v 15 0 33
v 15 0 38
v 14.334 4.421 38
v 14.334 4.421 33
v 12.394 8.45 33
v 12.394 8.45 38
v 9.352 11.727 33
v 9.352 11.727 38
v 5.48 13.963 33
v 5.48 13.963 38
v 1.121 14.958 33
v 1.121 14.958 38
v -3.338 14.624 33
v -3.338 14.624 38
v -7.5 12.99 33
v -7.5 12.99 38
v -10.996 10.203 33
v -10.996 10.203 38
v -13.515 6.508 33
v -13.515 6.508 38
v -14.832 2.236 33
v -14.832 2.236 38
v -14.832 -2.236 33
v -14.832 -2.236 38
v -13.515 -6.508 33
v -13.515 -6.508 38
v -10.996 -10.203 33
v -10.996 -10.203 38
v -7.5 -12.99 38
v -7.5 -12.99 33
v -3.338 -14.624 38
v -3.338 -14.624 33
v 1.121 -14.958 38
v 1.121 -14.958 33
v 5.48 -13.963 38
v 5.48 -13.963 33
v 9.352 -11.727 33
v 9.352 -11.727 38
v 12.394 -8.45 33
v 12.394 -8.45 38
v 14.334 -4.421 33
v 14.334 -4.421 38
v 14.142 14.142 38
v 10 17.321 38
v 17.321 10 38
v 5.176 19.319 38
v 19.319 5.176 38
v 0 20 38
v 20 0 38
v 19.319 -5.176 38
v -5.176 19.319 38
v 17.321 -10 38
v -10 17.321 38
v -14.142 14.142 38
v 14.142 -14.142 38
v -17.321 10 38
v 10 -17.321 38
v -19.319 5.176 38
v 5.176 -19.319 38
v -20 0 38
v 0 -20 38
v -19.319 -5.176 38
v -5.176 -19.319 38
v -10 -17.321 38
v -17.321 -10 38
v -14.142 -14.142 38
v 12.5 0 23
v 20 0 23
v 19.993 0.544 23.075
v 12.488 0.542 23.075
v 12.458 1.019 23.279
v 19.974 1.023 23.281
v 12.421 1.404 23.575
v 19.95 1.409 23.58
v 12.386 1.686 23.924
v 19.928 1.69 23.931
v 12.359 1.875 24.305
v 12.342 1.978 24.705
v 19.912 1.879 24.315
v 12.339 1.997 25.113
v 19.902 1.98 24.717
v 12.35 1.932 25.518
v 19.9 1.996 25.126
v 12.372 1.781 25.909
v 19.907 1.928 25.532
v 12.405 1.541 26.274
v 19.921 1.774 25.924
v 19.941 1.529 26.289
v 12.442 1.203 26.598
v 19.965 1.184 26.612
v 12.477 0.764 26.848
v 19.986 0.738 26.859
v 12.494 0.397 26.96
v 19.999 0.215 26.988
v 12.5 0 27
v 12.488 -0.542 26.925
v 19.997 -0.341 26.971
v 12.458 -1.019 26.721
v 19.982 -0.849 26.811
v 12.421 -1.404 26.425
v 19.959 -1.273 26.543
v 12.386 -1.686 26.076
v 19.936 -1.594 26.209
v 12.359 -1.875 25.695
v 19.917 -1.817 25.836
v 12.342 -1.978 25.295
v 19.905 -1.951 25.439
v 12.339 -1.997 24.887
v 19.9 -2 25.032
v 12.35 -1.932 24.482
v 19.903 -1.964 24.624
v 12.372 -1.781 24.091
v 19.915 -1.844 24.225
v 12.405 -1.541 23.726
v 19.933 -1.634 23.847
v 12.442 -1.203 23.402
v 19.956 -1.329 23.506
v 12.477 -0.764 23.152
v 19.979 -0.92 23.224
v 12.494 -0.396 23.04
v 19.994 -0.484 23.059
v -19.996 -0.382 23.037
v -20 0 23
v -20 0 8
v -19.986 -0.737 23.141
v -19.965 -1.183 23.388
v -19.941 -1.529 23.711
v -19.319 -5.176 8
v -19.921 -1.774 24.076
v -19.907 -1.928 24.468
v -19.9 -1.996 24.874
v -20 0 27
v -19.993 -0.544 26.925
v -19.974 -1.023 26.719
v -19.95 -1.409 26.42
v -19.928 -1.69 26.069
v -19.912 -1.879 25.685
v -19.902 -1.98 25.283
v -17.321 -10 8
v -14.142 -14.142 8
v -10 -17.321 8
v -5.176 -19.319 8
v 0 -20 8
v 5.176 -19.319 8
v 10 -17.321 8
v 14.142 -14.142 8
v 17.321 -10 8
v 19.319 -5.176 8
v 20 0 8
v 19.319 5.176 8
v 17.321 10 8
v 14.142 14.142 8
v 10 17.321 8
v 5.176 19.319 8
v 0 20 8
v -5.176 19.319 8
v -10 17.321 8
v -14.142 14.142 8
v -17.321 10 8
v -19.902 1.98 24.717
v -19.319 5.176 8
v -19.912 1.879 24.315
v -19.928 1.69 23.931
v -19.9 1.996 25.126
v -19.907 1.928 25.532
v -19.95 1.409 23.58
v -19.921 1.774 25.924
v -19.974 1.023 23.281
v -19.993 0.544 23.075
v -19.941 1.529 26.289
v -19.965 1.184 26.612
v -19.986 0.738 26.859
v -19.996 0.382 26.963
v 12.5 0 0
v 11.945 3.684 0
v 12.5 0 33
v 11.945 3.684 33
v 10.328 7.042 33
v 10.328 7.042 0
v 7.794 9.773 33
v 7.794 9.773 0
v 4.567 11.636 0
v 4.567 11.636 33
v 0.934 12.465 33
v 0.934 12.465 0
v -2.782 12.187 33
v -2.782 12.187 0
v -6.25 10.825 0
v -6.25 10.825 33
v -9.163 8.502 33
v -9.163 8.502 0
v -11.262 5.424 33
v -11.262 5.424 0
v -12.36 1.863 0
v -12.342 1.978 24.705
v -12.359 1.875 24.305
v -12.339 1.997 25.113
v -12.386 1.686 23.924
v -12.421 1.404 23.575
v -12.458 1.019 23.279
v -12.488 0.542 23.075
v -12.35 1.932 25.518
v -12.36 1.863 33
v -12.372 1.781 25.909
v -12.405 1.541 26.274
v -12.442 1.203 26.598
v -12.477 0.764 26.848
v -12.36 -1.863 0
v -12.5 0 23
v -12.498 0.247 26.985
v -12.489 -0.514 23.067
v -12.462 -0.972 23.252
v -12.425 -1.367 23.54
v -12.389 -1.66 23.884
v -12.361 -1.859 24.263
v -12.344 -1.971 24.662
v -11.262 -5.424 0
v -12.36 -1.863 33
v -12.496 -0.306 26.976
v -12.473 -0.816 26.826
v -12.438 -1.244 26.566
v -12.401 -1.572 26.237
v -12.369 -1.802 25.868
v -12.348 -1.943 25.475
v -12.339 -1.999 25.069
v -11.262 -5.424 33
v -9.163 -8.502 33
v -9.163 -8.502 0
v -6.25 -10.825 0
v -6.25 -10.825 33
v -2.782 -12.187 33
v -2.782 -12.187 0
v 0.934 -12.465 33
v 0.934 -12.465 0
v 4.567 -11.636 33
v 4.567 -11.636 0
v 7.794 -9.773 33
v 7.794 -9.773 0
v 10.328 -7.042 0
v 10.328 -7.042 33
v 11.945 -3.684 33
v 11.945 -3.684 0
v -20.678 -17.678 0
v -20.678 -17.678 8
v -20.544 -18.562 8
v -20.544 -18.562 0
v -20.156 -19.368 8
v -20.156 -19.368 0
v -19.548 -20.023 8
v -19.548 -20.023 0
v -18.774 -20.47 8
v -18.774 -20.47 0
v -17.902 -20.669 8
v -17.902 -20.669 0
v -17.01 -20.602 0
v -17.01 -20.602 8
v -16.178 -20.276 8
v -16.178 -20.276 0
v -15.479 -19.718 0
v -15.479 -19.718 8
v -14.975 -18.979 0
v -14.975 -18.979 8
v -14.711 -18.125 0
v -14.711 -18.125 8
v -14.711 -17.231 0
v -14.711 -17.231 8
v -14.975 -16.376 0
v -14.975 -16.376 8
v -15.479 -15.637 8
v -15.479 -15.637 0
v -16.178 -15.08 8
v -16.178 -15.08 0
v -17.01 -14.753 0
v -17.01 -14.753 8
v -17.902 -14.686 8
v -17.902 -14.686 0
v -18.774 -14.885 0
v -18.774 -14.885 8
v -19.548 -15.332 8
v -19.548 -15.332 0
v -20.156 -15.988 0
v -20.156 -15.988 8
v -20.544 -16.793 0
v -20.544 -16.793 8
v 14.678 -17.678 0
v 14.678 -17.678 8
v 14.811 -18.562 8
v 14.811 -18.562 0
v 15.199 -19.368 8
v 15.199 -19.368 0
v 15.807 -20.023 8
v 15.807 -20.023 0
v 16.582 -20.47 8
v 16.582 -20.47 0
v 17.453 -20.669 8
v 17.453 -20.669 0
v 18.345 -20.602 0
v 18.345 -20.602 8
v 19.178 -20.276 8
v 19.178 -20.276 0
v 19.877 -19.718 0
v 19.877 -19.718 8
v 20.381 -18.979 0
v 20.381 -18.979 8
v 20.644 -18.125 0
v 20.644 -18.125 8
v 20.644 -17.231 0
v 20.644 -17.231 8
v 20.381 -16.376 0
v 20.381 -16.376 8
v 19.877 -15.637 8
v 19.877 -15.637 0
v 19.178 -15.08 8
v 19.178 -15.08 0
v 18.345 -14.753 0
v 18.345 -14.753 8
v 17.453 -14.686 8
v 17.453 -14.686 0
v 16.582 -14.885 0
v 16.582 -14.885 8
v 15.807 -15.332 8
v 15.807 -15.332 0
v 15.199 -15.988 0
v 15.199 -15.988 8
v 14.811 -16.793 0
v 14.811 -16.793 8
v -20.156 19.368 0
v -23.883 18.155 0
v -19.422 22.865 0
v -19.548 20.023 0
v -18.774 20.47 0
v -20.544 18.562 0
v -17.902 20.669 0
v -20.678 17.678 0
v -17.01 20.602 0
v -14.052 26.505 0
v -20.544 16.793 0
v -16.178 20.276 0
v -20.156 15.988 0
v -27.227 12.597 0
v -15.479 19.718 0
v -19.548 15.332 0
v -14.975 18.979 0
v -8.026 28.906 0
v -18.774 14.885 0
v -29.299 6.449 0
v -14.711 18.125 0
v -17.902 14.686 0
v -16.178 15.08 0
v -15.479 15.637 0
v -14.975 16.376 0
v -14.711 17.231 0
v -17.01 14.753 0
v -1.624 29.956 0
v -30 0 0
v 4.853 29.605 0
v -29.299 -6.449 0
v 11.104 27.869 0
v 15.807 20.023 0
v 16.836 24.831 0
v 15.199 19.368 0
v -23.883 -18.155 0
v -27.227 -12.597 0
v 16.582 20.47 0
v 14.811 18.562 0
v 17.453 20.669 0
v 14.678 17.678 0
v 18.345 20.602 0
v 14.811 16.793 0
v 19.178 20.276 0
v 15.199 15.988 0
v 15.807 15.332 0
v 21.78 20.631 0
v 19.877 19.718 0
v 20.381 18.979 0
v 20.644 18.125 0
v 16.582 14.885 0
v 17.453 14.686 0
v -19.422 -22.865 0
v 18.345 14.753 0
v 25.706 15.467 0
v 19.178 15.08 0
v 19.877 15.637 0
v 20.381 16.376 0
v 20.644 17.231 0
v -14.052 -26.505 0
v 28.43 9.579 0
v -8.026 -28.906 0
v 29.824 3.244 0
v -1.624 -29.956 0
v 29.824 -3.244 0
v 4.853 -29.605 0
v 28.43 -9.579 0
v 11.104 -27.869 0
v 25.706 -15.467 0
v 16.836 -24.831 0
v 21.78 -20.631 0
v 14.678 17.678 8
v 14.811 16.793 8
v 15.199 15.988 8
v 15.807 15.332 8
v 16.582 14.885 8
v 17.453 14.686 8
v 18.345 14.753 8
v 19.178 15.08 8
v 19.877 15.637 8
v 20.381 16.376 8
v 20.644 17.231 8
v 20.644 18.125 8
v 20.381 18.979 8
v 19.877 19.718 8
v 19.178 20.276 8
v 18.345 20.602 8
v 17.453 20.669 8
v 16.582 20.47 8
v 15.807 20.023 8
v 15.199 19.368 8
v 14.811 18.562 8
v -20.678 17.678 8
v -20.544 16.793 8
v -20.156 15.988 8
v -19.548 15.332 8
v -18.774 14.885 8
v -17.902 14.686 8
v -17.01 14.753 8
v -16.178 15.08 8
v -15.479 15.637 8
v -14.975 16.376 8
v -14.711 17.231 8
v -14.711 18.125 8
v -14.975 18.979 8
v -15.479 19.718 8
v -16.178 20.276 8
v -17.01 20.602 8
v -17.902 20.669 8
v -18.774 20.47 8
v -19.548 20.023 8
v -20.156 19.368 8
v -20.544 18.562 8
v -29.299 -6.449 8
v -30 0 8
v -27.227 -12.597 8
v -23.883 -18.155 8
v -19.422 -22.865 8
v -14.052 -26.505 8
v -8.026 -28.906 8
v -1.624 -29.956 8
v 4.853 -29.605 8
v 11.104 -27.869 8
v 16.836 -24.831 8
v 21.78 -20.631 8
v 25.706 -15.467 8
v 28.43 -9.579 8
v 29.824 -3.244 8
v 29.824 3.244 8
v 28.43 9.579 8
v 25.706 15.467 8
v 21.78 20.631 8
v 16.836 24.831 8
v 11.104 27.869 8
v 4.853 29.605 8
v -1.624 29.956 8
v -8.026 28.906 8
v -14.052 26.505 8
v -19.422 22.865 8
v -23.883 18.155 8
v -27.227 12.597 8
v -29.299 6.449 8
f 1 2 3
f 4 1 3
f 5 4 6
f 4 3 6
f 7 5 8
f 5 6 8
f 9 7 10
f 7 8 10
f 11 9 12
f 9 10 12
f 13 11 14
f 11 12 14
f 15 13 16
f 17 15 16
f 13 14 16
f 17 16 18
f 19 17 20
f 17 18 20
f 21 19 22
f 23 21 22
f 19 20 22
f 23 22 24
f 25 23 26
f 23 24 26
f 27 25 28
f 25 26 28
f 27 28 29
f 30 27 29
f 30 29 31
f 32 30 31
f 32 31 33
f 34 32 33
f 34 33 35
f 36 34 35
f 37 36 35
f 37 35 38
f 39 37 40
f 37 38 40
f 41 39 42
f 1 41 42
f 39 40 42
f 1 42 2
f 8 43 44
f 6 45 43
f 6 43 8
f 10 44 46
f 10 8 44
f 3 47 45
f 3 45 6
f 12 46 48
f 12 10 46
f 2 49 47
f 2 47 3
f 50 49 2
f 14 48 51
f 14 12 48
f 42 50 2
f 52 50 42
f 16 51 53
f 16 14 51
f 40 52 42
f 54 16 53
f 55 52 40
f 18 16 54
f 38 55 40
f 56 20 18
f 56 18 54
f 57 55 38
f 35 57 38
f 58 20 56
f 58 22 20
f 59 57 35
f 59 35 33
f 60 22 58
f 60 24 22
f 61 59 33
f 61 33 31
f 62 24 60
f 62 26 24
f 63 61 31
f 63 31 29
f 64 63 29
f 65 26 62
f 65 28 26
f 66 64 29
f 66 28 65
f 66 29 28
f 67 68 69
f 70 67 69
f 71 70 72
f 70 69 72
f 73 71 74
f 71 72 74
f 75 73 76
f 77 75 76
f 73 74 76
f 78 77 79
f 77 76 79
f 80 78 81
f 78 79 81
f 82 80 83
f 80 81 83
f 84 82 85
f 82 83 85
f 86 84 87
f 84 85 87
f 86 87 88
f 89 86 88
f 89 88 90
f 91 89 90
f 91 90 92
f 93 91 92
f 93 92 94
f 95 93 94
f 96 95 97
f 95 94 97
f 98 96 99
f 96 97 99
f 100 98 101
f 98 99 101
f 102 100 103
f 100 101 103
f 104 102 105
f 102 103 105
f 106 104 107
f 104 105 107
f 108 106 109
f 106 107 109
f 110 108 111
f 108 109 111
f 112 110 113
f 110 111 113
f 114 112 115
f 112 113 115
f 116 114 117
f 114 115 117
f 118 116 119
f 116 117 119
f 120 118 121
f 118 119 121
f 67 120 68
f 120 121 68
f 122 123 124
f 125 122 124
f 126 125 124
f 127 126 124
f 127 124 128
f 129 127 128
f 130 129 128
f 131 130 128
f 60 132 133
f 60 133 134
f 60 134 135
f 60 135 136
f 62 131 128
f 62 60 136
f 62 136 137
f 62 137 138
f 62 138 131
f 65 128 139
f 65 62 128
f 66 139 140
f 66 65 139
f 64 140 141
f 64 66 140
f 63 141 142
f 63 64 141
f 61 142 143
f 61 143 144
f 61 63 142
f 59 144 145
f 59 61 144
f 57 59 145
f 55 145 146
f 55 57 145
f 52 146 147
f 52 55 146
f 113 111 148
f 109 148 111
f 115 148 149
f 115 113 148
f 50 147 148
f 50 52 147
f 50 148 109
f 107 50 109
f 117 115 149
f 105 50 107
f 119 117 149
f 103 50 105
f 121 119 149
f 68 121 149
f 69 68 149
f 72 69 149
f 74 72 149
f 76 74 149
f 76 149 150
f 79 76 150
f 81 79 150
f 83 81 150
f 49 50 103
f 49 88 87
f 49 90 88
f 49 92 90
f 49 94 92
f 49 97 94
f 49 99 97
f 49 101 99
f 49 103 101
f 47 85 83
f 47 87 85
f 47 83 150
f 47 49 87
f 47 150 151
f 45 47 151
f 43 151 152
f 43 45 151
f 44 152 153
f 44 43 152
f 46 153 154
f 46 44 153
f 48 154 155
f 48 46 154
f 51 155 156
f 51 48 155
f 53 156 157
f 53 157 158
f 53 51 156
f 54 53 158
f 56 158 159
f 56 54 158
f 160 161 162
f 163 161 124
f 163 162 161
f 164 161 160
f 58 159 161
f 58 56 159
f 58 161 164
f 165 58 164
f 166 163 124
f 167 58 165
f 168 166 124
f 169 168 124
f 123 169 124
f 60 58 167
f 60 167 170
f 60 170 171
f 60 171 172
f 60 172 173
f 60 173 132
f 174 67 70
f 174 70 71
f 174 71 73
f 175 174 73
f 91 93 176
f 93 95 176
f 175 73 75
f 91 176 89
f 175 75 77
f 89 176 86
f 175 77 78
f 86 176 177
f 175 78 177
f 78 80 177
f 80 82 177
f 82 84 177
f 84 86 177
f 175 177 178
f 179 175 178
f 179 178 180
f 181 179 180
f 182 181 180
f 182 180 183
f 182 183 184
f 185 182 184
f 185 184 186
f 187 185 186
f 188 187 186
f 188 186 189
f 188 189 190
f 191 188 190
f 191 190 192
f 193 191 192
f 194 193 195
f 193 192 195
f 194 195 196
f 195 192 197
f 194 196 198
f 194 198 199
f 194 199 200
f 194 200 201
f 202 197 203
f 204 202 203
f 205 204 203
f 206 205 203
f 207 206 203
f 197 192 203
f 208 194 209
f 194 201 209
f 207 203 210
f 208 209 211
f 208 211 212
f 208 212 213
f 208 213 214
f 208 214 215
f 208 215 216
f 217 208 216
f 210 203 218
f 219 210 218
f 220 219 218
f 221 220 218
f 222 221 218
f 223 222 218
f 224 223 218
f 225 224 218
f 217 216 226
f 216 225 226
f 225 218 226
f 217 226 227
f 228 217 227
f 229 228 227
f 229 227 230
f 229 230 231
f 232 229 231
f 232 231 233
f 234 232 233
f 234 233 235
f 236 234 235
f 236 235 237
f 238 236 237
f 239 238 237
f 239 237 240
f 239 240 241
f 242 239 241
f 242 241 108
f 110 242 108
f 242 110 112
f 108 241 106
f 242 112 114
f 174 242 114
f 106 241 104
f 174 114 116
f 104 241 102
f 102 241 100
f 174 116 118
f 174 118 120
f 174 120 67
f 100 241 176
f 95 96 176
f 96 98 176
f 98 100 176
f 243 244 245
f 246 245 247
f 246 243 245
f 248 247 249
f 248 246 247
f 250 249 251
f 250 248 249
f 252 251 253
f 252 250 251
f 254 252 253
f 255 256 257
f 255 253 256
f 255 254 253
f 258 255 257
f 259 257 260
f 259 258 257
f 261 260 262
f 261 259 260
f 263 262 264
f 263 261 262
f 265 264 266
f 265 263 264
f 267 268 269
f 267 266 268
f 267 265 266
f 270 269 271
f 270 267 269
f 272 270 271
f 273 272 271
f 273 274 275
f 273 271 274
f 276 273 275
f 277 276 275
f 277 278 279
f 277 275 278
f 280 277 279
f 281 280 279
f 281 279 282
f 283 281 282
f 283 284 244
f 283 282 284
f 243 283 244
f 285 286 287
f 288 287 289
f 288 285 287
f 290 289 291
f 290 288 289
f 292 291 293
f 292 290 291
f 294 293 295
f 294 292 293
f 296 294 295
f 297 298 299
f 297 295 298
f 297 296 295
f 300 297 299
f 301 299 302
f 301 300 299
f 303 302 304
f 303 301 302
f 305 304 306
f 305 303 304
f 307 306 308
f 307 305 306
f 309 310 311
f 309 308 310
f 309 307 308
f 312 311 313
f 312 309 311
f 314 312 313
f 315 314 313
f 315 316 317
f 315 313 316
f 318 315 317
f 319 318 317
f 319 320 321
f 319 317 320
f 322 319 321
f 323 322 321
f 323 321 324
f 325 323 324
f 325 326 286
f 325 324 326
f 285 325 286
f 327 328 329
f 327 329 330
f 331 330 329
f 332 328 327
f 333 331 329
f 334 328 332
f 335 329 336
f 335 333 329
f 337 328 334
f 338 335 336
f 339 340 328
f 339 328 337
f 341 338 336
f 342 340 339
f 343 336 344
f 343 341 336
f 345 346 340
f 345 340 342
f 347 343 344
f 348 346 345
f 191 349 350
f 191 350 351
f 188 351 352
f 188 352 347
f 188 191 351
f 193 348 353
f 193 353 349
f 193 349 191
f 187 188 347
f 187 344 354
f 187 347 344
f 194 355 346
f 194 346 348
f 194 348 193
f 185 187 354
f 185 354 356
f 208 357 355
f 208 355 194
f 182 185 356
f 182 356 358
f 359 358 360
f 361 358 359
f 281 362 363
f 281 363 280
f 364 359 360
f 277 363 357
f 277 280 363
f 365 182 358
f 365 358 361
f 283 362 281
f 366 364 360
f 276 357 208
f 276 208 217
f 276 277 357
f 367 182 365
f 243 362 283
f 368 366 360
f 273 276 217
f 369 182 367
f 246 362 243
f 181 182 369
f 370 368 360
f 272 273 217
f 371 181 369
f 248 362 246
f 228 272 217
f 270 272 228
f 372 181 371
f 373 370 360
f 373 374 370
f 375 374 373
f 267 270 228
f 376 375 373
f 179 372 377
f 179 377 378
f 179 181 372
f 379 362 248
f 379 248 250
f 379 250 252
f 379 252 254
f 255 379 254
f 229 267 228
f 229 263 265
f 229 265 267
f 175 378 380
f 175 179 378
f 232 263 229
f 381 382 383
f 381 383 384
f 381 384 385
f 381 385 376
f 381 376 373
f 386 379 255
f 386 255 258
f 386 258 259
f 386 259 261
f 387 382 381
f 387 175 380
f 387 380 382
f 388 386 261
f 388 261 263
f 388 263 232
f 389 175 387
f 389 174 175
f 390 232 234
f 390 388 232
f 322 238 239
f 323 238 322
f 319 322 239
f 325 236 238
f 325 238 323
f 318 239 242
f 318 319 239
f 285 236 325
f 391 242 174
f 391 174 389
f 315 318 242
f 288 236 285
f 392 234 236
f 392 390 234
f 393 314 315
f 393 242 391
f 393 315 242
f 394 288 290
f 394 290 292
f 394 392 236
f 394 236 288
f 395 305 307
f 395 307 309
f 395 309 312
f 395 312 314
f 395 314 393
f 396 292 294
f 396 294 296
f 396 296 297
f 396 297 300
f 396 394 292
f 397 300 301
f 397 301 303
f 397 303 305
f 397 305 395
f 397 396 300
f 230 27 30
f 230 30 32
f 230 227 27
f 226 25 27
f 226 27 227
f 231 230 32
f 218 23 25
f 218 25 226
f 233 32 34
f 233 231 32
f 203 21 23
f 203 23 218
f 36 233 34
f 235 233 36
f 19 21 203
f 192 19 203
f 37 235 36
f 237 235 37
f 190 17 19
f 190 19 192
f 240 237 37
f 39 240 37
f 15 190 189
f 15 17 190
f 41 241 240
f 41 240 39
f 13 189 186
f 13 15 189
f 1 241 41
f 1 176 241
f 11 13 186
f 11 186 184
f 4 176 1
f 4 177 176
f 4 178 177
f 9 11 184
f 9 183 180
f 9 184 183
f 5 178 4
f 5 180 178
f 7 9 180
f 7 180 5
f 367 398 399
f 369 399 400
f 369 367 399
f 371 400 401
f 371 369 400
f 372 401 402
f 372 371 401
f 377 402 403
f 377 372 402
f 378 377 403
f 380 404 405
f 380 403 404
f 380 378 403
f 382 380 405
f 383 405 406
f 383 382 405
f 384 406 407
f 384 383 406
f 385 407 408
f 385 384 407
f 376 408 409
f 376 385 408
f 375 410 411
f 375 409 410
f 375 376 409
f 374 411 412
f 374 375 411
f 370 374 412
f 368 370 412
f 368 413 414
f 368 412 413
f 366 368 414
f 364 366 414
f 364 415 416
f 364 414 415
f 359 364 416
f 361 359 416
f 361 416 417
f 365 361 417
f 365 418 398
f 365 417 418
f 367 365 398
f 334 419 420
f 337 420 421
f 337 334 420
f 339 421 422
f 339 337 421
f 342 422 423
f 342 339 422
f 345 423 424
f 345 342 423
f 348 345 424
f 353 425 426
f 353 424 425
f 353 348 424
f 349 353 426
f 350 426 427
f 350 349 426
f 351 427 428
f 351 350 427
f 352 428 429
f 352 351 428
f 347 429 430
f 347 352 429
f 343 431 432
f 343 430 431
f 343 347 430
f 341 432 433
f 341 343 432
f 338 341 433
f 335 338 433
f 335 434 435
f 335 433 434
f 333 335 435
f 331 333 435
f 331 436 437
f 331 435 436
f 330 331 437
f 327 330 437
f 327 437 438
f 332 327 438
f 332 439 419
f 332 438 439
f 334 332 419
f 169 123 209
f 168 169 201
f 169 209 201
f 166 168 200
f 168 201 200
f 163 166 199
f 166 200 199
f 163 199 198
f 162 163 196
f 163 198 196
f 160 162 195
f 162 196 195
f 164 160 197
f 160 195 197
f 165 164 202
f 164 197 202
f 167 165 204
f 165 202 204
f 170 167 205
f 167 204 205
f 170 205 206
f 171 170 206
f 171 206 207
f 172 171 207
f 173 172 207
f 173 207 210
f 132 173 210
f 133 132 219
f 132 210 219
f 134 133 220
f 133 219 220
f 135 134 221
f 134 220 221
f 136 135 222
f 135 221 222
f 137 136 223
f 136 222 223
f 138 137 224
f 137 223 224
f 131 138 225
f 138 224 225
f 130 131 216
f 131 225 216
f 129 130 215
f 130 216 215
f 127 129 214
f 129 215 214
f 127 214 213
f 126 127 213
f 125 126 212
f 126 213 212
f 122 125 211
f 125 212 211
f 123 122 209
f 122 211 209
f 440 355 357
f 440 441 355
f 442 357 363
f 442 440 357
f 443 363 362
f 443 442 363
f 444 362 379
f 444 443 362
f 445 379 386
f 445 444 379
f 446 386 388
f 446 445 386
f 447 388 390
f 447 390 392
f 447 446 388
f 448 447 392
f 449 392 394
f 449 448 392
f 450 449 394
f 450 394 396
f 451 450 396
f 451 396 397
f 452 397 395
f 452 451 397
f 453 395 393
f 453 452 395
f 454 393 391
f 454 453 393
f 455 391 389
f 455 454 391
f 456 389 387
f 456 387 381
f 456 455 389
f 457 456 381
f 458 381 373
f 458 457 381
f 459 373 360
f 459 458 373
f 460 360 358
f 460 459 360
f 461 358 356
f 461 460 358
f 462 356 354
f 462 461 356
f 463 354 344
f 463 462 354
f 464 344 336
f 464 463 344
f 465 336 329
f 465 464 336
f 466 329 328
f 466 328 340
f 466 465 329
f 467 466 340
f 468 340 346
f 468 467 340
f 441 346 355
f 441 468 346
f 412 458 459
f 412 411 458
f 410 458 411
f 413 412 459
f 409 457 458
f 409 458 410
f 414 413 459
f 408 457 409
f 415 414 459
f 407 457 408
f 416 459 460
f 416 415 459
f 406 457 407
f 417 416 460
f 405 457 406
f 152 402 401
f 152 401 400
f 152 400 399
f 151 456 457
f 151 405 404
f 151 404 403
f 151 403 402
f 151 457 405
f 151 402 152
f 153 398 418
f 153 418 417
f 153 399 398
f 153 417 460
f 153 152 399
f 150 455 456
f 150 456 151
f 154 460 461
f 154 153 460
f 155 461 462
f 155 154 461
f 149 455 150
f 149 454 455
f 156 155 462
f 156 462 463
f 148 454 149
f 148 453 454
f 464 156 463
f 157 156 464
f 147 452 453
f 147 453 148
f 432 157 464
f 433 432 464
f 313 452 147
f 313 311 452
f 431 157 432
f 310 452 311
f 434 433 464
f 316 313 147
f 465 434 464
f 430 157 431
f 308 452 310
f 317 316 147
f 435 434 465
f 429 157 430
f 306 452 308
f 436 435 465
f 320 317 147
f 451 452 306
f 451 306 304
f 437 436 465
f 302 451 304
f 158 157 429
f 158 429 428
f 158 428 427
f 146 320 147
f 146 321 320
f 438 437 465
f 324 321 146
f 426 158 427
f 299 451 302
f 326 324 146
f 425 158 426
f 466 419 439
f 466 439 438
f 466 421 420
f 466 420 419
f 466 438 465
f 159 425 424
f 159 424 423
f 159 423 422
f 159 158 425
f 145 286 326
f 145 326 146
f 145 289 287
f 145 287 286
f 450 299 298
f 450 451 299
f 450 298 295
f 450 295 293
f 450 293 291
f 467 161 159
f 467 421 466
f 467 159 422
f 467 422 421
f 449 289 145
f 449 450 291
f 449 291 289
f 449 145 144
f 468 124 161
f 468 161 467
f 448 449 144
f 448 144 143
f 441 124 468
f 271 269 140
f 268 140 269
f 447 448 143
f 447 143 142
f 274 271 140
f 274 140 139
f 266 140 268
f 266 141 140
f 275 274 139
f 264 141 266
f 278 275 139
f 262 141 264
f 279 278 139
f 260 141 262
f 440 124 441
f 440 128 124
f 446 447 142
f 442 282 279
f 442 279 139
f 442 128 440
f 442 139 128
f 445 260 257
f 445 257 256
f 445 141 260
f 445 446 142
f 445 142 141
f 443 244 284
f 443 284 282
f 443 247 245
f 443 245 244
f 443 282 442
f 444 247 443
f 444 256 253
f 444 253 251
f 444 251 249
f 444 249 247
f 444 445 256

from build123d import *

# Parameters (mm, degrees)
SKETCH_2_R          = 15
CUT_EXTRUDE_1_DEPTH = 5
SKETCH_3_R          = 12.5
CUT_EXTRUDE_2_DEPTH = 57.956123464
SKETCH_5_R          = 3
CUT_EXTRUDE_5_DEPTH = 57.956123464
SKETCH_6_R          = 2
CUT_EXTRUDE_6_DEPTH = 61


with BuildPart() as part:
    # 草图1 → 旋转1 (revolve)
    with BuildSketch(Plane(origin=(0, 0, 0), x_dir=(1, 0, 0), z_dir=(0, 1, 0)), mode=Mode.PRIVATE) as revolve_1_sk:
        Polygon((0, 0), (30, 0), (30, -8), (20, -8), (20, -38), (0, -38), align=None)
    revolve(revolve_1_sk.sketch.rotate(Axis((0, 0, 0), (0, 0, 1)), 180), axis=Axis((0, 0, 0), (0, 0, 1)))

    # 草图2 → 切除-拉伸1 (cut)
    with BuildSketch(Plane.XY.offset(38)):
        Circle(SKETCH_2_R)
    extrude(amount=-CUT_EXTRUDE_1_DEPTH, mode=Mode.SUBTRACT)

    # 草图3 → 切除-拉伸2 (cut, through all)
    with BuildSketch(Plane.XY.offset(38)):
        Circle(SKETCH_3_R)
    extrude(amount=-CUT_EXTRUDE_2_DEPTH, mode=Mode.SUBTRACT)

    # 草图5 → 切除-拉伸5 (cut, through all)
    with BuildSketch(Plane.XY):
        with Locations(Location((17.67767, 17.67767, 0), (0, 0, 180))):
            Circle(SKETCH_5_R)
        with Locations(Location((-17.67767, 17.67767, 0), (0, 0, 180))):
            Circle(SKETCH_5_R)
        with Locations(Location((-17.67767, -17.67767, 0), (0, 0, 180))):
            Circle(SKETCH_5_R)
        with Locations(Location((17.67767, -17.67767, 0), (0, 0, 180))):
            Circle(SKETCH_5_R)
    extrude(amount=CUT_EXTRUDE_5_DEPTH, mode=Mode.SUBTRACT)

    # 草图6 → 切除-拉伸6 (cut, symmetric)
    with BuildSketch(Plane(origin=(0, 0, 0), x_dir=(0, 0, -1), z_dir=(1, 0, 0))):
        with Locations((-25, 0)):
            Circle(SKETCH_6_R)
    extrude(amount=CUT_EXTRUDE_6_DEPTH, both=True, mode=Mode.SUBTRACT)


solid = part.part
